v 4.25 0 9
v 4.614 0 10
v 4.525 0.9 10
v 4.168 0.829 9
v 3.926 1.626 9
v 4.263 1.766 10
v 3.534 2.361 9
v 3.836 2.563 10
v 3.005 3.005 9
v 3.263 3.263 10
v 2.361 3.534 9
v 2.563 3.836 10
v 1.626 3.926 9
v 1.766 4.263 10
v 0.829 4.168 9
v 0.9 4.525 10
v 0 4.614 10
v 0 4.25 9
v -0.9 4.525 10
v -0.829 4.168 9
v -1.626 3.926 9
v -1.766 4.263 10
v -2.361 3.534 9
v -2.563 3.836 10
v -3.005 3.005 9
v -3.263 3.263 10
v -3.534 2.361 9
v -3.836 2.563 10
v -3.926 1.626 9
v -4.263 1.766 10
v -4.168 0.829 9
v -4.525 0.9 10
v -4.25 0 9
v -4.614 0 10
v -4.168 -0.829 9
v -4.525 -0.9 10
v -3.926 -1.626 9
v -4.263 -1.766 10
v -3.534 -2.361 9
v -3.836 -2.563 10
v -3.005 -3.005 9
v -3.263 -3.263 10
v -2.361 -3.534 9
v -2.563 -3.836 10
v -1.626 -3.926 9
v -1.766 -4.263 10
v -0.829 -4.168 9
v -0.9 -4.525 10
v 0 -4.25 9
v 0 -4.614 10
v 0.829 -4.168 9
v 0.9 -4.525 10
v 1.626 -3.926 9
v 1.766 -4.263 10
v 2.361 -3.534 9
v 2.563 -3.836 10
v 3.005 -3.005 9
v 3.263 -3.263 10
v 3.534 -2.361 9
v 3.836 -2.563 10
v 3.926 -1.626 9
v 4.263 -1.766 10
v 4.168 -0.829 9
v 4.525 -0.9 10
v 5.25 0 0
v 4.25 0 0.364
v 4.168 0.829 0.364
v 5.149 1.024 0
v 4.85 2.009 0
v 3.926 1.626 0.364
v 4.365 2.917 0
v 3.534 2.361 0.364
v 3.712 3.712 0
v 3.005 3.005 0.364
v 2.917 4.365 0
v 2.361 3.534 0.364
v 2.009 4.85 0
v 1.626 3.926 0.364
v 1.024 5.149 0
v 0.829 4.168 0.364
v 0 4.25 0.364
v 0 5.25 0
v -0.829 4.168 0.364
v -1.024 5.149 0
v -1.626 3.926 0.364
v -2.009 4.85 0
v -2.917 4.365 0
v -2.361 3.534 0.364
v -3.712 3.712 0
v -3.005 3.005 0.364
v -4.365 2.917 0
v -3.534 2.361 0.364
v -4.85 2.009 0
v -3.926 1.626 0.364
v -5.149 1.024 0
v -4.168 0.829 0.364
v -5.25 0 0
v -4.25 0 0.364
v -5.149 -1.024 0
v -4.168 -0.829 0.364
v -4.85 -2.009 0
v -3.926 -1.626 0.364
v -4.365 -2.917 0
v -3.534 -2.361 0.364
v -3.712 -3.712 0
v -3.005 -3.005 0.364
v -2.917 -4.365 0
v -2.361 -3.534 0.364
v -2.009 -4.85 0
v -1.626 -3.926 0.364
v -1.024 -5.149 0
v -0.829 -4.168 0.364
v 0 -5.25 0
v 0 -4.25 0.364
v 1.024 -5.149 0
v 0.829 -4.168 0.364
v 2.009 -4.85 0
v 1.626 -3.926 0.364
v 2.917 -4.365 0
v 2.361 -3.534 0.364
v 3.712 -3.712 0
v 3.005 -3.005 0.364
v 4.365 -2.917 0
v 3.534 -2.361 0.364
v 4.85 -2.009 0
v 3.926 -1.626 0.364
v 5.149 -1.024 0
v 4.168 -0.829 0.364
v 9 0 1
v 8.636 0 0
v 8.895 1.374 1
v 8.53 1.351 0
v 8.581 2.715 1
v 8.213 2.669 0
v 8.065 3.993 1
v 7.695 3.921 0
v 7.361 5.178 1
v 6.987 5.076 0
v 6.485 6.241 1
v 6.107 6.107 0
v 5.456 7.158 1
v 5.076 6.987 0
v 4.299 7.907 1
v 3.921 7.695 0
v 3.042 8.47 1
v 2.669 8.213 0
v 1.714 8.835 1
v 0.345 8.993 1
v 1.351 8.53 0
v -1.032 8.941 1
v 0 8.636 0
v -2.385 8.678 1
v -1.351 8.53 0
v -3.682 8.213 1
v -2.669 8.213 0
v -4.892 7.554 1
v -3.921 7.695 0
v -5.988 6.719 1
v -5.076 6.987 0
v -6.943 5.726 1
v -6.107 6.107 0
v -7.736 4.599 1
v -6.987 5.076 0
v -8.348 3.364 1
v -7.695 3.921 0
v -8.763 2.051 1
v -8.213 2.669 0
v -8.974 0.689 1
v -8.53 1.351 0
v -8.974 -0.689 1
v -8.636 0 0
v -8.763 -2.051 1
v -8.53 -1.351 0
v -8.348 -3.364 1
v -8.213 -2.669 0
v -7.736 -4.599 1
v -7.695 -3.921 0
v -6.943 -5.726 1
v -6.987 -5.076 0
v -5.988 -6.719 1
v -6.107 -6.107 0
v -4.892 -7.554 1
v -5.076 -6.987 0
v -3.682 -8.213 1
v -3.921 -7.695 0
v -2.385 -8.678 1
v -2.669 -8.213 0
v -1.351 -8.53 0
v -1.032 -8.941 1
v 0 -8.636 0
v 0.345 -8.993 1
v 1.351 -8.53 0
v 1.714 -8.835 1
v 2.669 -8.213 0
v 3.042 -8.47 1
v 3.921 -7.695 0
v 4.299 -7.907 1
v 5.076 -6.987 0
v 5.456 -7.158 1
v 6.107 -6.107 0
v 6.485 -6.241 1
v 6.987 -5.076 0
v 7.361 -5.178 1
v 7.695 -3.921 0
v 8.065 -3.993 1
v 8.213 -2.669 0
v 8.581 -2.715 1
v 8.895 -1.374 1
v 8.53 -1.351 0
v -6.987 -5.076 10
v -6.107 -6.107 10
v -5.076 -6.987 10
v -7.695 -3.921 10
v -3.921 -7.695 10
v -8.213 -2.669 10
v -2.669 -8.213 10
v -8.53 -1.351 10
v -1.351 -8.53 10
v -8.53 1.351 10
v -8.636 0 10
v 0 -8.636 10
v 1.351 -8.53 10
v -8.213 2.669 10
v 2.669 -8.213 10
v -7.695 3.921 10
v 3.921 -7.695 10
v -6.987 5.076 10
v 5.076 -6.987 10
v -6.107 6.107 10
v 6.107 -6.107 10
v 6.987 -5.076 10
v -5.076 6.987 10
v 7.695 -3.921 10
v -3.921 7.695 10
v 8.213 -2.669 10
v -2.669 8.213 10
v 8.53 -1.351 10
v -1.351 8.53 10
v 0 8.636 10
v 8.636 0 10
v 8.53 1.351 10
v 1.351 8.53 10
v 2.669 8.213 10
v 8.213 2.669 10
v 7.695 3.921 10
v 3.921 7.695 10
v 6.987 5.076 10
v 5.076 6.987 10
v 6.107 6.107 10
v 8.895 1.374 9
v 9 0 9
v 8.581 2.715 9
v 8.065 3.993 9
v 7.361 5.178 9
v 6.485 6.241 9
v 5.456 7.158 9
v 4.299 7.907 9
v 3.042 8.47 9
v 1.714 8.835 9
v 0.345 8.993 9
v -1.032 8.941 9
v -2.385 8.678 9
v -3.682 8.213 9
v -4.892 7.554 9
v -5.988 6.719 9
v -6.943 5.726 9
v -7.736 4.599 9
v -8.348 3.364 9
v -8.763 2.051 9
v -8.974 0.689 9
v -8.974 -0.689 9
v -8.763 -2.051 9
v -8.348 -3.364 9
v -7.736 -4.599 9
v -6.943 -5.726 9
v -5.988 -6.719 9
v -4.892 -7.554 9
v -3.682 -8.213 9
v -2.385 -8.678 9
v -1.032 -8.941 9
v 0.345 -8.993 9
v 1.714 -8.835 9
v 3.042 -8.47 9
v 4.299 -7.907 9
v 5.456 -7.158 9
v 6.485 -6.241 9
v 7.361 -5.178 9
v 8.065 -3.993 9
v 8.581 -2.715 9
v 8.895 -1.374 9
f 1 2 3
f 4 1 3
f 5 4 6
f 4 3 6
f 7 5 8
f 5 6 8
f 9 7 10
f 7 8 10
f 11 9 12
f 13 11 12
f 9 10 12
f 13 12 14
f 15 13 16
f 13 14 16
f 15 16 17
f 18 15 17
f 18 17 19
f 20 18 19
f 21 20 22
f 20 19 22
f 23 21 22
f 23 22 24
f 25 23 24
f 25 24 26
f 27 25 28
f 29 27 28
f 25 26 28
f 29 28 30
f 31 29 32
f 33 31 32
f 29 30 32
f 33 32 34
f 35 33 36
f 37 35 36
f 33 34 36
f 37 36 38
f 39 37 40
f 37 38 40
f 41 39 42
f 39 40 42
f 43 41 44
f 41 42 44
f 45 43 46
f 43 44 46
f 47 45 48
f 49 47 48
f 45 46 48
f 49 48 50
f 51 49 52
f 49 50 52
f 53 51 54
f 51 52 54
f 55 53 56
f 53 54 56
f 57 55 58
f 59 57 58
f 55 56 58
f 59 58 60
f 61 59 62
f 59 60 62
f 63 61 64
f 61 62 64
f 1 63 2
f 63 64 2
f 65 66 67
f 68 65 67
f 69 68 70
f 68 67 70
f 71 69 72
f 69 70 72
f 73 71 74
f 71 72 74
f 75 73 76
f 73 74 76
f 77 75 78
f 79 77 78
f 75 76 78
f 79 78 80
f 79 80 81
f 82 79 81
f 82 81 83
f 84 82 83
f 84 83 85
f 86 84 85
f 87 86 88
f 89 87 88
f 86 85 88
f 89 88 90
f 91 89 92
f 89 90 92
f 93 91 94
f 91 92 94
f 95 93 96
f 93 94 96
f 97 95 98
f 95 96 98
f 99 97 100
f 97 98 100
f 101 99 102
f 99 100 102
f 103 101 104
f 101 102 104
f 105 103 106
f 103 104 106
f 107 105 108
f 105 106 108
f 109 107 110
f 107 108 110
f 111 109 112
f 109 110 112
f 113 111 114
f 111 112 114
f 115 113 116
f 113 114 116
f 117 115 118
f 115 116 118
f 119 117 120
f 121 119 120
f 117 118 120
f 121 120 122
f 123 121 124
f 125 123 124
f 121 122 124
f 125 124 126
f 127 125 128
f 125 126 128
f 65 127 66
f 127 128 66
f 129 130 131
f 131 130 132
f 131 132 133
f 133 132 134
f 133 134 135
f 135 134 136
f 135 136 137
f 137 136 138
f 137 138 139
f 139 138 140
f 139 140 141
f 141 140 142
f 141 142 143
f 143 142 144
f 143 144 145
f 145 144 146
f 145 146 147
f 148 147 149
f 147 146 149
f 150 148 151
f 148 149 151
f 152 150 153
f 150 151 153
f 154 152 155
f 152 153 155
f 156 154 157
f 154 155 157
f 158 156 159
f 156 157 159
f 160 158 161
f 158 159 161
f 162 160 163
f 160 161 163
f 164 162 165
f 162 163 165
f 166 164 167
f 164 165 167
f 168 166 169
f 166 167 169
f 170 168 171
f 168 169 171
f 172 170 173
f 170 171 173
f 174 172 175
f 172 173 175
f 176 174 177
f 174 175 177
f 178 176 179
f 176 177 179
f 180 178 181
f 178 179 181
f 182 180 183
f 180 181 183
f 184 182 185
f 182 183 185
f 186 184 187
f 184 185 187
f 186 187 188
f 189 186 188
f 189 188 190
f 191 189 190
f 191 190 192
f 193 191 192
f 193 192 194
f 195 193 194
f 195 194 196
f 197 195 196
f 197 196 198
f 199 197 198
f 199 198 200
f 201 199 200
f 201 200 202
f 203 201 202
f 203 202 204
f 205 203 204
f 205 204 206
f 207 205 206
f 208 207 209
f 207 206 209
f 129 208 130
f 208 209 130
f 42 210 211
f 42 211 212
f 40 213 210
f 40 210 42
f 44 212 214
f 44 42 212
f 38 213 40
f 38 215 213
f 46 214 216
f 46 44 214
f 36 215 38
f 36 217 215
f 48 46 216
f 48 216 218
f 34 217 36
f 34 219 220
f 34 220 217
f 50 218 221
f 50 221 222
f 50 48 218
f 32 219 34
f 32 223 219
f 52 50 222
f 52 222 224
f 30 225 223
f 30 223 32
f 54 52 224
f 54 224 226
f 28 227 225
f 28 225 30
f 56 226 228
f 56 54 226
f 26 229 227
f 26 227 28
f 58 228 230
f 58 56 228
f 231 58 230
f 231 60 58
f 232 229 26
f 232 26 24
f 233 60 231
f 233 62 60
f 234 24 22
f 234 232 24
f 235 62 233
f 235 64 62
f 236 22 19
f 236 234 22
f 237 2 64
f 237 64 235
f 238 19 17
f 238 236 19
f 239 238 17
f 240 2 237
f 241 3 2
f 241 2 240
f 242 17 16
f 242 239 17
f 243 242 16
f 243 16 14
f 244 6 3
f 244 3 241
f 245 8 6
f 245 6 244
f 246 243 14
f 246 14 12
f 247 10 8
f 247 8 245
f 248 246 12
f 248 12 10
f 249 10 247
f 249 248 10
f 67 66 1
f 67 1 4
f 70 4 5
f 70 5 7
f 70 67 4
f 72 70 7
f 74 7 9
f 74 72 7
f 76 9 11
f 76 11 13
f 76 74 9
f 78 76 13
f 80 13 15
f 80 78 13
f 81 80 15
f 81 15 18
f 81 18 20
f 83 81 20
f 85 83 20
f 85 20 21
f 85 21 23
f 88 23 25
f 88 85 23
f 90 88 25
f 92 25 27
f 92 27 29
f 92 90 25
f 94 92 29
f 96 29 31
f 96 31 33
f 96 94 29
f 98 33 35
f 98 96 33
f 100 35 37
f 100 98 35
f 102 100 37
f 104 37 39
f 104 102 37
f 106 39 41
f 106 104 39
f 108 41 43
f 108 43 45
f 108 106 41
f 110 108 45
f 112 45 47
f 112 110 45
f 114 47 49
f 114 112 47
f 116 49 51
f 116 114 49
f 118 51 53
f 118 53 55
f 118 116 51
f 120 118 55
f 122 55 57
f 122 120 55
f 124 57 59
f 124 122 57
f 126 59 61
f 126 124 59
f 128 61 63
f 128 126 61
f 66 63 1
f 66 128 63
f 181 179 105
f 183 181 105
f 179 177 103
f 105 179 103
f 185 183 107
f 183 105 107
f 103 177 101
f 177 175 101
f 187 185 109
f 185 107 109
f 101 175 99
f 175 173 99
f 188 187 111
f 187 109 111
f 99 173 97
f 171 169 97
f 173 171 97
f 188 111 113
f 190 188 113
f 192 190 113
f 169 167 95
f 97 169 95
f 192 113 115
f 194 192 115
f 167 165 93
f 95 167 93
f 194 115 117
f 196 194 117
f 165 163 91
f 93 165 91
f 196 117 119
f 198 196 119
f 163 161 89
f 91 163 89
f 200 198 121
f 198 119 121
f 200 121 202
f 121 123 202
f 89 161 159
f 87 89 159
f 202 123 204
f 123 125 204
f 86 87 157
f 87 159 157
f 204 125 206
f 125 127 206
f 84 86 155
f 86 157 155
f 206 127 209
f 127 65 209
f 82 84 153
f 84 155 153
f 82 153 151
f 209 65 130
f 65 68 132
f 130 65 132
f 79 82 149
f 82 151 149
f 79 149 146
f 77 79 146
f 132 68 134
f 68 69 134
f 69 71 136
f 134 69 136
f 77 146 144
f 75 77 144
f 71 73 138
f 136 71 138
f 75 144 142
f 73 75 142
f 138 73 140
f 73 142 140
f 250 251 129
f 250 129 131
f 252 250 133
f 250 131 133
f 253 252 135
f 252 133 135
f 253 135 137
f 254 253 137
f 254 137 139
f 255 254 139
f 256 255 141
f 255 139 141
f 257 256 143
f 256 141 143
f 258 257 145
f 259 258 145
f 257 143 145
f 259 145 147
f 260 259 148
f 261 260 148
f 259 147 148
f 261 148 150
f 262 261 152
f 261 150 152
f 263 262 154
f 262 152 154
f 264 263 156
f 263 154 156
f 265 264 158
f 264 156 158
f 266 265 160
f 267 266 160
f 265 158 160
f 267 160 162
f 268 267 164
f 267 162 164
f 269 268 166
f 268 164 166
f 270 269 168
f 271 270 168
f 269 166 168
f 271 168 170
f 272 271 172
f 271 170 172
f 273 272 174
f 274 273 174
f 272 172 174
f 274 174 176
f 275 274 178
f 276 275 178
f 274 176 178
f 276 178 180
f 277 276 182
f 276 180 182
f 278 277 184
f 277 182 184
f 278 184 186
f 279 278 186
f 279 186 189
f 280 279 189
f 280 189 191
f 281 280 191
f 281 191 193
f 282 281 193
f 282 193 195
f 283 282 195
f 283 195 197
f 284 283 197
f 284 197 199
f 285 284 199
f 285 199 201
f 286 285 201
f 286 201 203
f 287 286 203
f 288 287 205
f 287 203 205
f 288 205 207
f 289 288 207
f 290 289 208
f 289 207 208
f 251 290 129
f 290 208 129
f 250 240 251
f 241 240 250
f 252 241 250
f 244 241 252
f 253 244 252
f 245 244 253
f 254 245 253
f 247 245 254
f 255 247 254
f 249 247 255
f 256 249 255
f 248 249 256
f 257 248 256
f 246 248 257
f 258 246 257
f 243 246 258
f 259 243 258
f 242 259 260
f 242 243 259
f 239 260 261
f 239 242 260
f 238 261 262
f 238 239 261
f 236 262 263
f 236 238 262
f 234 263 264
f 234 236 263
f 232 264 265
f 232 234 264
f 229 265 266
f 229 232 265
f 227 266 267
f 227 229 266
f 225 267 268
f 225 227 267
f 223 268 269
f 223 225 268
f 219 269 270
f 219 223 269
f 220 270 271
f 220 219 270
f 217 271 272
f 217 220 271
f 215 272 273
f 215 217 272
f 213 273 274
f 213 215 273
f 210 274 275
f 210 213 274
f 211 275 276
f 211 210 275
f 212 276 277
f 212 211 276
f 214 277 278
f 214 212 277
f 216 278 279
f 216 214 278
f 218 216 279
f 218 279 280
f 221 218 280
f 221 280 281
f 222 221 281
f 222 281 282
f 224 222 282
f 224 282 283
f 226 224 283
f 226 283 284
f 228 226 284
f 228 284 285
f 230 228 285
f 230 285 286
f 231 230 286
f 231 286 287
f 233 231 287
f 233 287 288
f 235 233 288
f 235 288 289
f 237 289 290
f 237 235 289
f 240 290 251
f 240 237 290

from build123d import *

# Parameters (mm, degrees)
F0_R     = 9
F0_R_2   = 4.25
F1_DEPTH = 10
F2_SIZE2 = 0.3639702343
F2_SIZE  = 1
F3_SIZE2 = 0.3639702343
F3_SIZE  = 1
F4_SIZE2 = 0.3639702343
F4_SIZE  = 1
F5_SIZE2 = 0.3639702343
F5_SIZE  = 1


with BuildPart() as f1:
    # F0 (on Top) → F1 (new body)
    with BuildSketch(Plane.XY):
        Circle(F0_R)
        Circle(F0_R_2, mode=Mode.SUBTRACT)
    extrude(amount=F1_DEPTH)

    # F2
    f2_edges = [f1.edges().sort_by_distance(p)[0] for p in [
        (-4.25, 0, 10),
    ]]
    f2_side = f1.faces().sort_by_distance((-4.25, 0, 5))[0]
    chamfer(f2_edges, length=F2_SIZE, length2=F2_SIZE2, reference=f2_side)

    # F3
    f3_edges = [f1.edges().sort_by_distance(p)[0] for p in [
        (-9, 0, 10),
    ]]
    f3_side = f1.faces().sort_by_distance((-9, 0, 5))[0]
    chamfer(f3_edges, length=F3_SIZE, length2=F3_SIZE2, reference=f3_side)

    # F4
    f4_edges = [f1.edges().sort_by_distance(p)[0] for p in [
        (-9, 0, 0),
    ]]
    f4_side = f1.faces().sort_by_distance((-9, 0, 4.5))[0]
    chamfer(f4_edges, length=F4_SIZE, length2=F4_SIZE2, reference=f4_side)

    # F5
    f5_edges = [f1.edges().sort_by_distance(p)[0] for p in [
        (-4.25, 0, 0),
    ]]
    f5_side = f1.faces().sort_by_distance((-8.391766, 0, 0))[0]
    chamfer(f5_edges, length=F5_SIZE, length2=F5_SIZE2, reference=f5_side)


solid = f1.part
